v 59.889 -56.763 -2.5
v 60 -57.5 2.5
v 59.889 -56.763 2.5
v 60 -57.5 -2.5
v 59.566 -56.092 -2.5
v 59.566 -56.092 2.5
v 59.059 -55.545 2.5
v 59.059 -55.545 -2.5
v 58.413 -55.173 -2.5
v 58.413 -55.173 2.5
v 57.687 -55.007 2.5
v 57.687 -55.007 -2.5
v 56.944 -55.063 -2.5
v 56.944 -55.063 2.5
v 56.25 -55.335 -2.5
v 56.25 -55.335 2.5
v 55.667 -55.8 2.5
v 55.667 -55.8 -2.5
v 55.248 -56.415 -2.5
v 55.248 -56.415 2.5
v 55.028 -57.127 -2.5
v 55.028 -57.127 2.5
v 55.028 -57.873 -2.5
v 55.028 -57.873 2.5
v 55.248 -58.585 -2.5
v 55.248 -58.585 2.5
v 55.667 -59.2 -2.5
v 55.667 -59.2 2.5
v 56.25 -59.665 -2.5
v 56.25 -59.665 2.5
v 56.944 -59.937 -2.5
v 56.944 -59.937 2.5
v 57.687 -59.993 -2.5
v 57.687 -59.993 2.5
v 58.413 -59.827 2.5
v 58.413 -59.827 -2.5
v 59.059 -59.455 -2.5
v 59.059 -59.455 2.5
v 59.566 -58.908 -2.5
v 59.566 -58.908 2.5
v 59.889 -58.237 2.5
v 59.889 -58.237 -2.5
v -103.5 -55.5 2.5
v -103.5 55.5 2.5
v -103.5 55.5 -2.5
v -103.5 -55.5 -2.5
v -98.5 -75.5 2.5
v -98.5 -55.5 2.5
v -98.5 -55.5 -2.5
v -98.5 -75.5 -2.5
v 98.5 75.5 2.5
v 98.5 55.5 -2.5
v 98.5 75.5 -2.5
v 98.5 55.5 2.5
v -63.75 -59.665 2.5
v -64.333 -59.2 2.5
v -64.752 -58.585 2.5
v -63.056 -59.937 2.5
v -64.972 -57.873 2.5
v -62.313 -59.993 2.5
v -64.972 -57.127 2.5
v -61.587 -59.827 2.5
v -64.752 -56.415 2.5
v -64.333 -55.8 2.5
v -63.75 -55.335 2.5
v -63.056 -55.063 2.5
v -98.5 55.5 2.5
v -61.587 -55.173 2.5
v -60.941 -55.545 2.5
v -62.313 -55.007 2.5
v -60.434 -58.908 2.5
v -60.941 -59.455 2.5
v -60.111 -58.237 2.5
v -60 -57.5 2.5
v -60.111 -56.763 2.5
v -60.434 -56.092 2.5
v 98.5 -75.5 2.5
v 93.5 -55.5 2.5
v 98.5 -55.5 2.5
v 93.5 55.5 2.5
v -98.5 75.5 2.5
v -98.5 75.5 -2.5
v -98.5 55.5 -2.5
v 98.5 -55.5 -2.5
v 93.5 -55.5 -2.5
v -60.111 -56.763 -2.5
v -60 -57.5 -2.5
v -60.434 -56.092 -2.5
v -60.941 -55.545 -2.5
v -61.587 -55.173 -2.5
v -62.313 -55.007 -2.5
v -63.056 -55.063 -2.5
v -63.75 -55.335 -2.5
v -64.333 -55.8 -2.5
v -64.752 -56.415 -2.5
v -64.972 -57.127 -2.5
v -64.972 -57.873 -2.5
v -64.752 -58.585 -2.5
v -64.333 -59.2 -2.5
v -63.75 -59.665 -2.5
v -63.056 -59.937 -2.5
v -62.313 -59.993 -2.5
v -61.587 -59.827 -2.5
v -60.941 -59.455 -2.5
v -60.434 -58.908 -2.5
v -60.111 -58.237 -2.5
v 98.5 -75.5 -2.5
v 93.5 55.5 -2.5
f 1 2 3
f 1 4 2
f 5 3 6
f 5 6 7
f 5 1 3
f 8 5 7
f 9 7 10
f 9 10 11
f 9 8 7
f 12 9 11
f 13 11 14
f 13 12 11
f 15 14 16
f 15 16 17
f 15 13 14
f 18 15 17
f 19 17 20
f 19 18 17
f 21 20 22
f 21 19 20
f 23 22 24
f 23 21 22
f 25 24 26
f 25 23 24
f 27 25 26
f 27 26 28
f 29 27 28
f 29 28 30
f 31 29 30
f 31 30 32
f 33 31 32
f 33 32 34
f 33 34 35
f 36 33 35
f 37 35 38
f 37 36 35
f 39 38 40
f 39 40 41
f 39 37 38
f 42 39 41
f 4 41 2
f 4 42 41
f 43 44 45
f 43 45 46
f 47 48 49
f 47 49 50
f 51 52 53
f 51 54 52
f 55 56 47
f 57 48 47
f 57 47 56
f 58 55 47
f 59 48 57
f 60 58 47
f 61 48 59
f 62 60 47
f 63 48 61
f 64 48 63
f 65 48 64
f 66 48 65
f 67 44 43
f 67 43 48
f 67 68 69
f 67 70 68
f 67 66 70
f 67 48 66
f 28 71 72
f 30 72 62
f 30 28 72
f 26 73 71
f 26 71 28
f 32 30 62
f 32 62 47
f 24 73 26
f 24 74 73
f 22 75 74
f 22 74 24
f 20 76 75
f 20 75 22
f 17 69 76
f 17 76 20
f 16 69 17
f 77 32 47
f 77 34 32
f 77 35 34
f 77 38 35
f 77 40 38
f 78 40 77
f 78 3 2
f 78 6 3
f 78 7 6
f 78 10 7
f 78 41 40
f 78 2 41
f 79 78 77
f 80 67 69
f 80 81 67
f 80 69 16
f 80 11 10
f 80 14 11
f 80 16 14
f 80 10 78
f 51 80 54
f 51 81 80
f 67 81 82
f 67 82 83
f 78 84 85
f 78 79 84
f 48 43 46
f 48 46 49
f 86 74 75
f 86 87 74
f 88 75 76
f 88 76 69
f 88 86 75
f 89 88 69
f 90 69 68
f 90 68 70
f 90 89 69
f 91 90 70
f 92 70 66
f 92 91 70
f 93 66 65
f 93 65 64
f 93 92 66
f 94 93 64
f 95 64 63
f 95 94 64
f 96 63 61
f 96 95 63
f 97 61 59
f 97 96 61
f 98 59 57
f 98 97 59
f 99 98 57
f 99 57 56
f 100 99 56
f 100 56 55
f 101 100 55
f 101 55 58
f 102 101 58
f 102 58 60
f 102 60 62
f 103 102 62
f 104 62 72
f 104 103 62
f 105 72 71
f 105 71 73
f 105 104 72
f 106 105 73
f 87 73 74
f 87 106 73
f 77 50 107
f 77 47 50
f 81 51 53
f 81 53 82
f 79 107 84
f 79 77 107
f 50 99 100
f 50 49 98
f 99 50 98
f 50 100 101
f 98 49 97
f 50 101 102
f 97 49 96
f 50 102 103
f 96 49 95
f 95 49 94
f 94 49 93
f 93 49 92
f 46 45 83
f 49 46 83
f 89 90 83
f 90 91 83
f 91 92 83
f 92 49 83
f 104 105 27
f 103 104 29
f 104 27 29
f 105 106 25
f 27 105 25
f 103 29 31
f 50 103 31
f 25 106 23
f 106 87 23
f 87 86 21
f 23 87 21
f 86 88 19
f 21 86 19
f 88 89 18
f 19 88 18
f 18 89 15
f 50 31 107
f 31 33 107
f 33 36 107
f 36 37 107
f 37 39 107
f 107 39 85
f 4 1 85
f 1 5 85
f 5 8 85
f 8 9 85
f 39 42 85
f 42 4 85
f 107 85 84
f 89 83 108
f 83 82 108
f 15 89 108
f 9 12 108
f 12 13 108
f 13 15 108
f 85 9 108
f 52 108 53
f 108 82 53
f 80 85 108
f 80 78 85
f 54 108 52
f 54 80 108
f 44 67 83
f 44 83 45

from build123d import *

# Parameters (mm, degrees)
SKETCH_R  = 2.5
PAD_DEPTH = 2.5


with BuildPart() as part:
    # Sketch → Pad (new body, symmetric)
    with BuildSketch(Plane.XY):
        Polygon((98.5, 55.5), (98.5, 75.5), (-98.5, 75.5), (-98.5, 55.5), (-103.5, 55.5), (-103.5, -55.5), (-98.5, -55.5), (-98.5, -75.5), (98.5, -75.5), (98.5, -55.5), (93.5, -55.5), (93.5, 55.5), align=None)
        with Locations((57.5, -57.5)):
            Circle(SKETCH_R, mode=Mode.SUBTRACT)
        with Locations((-62.5, -57.5)):
            Circle(SKETCH_R, mode=Mode.SUBTRACT)
    extrude(amount=PAD_DEPTH, both=True)


solid = part.part
